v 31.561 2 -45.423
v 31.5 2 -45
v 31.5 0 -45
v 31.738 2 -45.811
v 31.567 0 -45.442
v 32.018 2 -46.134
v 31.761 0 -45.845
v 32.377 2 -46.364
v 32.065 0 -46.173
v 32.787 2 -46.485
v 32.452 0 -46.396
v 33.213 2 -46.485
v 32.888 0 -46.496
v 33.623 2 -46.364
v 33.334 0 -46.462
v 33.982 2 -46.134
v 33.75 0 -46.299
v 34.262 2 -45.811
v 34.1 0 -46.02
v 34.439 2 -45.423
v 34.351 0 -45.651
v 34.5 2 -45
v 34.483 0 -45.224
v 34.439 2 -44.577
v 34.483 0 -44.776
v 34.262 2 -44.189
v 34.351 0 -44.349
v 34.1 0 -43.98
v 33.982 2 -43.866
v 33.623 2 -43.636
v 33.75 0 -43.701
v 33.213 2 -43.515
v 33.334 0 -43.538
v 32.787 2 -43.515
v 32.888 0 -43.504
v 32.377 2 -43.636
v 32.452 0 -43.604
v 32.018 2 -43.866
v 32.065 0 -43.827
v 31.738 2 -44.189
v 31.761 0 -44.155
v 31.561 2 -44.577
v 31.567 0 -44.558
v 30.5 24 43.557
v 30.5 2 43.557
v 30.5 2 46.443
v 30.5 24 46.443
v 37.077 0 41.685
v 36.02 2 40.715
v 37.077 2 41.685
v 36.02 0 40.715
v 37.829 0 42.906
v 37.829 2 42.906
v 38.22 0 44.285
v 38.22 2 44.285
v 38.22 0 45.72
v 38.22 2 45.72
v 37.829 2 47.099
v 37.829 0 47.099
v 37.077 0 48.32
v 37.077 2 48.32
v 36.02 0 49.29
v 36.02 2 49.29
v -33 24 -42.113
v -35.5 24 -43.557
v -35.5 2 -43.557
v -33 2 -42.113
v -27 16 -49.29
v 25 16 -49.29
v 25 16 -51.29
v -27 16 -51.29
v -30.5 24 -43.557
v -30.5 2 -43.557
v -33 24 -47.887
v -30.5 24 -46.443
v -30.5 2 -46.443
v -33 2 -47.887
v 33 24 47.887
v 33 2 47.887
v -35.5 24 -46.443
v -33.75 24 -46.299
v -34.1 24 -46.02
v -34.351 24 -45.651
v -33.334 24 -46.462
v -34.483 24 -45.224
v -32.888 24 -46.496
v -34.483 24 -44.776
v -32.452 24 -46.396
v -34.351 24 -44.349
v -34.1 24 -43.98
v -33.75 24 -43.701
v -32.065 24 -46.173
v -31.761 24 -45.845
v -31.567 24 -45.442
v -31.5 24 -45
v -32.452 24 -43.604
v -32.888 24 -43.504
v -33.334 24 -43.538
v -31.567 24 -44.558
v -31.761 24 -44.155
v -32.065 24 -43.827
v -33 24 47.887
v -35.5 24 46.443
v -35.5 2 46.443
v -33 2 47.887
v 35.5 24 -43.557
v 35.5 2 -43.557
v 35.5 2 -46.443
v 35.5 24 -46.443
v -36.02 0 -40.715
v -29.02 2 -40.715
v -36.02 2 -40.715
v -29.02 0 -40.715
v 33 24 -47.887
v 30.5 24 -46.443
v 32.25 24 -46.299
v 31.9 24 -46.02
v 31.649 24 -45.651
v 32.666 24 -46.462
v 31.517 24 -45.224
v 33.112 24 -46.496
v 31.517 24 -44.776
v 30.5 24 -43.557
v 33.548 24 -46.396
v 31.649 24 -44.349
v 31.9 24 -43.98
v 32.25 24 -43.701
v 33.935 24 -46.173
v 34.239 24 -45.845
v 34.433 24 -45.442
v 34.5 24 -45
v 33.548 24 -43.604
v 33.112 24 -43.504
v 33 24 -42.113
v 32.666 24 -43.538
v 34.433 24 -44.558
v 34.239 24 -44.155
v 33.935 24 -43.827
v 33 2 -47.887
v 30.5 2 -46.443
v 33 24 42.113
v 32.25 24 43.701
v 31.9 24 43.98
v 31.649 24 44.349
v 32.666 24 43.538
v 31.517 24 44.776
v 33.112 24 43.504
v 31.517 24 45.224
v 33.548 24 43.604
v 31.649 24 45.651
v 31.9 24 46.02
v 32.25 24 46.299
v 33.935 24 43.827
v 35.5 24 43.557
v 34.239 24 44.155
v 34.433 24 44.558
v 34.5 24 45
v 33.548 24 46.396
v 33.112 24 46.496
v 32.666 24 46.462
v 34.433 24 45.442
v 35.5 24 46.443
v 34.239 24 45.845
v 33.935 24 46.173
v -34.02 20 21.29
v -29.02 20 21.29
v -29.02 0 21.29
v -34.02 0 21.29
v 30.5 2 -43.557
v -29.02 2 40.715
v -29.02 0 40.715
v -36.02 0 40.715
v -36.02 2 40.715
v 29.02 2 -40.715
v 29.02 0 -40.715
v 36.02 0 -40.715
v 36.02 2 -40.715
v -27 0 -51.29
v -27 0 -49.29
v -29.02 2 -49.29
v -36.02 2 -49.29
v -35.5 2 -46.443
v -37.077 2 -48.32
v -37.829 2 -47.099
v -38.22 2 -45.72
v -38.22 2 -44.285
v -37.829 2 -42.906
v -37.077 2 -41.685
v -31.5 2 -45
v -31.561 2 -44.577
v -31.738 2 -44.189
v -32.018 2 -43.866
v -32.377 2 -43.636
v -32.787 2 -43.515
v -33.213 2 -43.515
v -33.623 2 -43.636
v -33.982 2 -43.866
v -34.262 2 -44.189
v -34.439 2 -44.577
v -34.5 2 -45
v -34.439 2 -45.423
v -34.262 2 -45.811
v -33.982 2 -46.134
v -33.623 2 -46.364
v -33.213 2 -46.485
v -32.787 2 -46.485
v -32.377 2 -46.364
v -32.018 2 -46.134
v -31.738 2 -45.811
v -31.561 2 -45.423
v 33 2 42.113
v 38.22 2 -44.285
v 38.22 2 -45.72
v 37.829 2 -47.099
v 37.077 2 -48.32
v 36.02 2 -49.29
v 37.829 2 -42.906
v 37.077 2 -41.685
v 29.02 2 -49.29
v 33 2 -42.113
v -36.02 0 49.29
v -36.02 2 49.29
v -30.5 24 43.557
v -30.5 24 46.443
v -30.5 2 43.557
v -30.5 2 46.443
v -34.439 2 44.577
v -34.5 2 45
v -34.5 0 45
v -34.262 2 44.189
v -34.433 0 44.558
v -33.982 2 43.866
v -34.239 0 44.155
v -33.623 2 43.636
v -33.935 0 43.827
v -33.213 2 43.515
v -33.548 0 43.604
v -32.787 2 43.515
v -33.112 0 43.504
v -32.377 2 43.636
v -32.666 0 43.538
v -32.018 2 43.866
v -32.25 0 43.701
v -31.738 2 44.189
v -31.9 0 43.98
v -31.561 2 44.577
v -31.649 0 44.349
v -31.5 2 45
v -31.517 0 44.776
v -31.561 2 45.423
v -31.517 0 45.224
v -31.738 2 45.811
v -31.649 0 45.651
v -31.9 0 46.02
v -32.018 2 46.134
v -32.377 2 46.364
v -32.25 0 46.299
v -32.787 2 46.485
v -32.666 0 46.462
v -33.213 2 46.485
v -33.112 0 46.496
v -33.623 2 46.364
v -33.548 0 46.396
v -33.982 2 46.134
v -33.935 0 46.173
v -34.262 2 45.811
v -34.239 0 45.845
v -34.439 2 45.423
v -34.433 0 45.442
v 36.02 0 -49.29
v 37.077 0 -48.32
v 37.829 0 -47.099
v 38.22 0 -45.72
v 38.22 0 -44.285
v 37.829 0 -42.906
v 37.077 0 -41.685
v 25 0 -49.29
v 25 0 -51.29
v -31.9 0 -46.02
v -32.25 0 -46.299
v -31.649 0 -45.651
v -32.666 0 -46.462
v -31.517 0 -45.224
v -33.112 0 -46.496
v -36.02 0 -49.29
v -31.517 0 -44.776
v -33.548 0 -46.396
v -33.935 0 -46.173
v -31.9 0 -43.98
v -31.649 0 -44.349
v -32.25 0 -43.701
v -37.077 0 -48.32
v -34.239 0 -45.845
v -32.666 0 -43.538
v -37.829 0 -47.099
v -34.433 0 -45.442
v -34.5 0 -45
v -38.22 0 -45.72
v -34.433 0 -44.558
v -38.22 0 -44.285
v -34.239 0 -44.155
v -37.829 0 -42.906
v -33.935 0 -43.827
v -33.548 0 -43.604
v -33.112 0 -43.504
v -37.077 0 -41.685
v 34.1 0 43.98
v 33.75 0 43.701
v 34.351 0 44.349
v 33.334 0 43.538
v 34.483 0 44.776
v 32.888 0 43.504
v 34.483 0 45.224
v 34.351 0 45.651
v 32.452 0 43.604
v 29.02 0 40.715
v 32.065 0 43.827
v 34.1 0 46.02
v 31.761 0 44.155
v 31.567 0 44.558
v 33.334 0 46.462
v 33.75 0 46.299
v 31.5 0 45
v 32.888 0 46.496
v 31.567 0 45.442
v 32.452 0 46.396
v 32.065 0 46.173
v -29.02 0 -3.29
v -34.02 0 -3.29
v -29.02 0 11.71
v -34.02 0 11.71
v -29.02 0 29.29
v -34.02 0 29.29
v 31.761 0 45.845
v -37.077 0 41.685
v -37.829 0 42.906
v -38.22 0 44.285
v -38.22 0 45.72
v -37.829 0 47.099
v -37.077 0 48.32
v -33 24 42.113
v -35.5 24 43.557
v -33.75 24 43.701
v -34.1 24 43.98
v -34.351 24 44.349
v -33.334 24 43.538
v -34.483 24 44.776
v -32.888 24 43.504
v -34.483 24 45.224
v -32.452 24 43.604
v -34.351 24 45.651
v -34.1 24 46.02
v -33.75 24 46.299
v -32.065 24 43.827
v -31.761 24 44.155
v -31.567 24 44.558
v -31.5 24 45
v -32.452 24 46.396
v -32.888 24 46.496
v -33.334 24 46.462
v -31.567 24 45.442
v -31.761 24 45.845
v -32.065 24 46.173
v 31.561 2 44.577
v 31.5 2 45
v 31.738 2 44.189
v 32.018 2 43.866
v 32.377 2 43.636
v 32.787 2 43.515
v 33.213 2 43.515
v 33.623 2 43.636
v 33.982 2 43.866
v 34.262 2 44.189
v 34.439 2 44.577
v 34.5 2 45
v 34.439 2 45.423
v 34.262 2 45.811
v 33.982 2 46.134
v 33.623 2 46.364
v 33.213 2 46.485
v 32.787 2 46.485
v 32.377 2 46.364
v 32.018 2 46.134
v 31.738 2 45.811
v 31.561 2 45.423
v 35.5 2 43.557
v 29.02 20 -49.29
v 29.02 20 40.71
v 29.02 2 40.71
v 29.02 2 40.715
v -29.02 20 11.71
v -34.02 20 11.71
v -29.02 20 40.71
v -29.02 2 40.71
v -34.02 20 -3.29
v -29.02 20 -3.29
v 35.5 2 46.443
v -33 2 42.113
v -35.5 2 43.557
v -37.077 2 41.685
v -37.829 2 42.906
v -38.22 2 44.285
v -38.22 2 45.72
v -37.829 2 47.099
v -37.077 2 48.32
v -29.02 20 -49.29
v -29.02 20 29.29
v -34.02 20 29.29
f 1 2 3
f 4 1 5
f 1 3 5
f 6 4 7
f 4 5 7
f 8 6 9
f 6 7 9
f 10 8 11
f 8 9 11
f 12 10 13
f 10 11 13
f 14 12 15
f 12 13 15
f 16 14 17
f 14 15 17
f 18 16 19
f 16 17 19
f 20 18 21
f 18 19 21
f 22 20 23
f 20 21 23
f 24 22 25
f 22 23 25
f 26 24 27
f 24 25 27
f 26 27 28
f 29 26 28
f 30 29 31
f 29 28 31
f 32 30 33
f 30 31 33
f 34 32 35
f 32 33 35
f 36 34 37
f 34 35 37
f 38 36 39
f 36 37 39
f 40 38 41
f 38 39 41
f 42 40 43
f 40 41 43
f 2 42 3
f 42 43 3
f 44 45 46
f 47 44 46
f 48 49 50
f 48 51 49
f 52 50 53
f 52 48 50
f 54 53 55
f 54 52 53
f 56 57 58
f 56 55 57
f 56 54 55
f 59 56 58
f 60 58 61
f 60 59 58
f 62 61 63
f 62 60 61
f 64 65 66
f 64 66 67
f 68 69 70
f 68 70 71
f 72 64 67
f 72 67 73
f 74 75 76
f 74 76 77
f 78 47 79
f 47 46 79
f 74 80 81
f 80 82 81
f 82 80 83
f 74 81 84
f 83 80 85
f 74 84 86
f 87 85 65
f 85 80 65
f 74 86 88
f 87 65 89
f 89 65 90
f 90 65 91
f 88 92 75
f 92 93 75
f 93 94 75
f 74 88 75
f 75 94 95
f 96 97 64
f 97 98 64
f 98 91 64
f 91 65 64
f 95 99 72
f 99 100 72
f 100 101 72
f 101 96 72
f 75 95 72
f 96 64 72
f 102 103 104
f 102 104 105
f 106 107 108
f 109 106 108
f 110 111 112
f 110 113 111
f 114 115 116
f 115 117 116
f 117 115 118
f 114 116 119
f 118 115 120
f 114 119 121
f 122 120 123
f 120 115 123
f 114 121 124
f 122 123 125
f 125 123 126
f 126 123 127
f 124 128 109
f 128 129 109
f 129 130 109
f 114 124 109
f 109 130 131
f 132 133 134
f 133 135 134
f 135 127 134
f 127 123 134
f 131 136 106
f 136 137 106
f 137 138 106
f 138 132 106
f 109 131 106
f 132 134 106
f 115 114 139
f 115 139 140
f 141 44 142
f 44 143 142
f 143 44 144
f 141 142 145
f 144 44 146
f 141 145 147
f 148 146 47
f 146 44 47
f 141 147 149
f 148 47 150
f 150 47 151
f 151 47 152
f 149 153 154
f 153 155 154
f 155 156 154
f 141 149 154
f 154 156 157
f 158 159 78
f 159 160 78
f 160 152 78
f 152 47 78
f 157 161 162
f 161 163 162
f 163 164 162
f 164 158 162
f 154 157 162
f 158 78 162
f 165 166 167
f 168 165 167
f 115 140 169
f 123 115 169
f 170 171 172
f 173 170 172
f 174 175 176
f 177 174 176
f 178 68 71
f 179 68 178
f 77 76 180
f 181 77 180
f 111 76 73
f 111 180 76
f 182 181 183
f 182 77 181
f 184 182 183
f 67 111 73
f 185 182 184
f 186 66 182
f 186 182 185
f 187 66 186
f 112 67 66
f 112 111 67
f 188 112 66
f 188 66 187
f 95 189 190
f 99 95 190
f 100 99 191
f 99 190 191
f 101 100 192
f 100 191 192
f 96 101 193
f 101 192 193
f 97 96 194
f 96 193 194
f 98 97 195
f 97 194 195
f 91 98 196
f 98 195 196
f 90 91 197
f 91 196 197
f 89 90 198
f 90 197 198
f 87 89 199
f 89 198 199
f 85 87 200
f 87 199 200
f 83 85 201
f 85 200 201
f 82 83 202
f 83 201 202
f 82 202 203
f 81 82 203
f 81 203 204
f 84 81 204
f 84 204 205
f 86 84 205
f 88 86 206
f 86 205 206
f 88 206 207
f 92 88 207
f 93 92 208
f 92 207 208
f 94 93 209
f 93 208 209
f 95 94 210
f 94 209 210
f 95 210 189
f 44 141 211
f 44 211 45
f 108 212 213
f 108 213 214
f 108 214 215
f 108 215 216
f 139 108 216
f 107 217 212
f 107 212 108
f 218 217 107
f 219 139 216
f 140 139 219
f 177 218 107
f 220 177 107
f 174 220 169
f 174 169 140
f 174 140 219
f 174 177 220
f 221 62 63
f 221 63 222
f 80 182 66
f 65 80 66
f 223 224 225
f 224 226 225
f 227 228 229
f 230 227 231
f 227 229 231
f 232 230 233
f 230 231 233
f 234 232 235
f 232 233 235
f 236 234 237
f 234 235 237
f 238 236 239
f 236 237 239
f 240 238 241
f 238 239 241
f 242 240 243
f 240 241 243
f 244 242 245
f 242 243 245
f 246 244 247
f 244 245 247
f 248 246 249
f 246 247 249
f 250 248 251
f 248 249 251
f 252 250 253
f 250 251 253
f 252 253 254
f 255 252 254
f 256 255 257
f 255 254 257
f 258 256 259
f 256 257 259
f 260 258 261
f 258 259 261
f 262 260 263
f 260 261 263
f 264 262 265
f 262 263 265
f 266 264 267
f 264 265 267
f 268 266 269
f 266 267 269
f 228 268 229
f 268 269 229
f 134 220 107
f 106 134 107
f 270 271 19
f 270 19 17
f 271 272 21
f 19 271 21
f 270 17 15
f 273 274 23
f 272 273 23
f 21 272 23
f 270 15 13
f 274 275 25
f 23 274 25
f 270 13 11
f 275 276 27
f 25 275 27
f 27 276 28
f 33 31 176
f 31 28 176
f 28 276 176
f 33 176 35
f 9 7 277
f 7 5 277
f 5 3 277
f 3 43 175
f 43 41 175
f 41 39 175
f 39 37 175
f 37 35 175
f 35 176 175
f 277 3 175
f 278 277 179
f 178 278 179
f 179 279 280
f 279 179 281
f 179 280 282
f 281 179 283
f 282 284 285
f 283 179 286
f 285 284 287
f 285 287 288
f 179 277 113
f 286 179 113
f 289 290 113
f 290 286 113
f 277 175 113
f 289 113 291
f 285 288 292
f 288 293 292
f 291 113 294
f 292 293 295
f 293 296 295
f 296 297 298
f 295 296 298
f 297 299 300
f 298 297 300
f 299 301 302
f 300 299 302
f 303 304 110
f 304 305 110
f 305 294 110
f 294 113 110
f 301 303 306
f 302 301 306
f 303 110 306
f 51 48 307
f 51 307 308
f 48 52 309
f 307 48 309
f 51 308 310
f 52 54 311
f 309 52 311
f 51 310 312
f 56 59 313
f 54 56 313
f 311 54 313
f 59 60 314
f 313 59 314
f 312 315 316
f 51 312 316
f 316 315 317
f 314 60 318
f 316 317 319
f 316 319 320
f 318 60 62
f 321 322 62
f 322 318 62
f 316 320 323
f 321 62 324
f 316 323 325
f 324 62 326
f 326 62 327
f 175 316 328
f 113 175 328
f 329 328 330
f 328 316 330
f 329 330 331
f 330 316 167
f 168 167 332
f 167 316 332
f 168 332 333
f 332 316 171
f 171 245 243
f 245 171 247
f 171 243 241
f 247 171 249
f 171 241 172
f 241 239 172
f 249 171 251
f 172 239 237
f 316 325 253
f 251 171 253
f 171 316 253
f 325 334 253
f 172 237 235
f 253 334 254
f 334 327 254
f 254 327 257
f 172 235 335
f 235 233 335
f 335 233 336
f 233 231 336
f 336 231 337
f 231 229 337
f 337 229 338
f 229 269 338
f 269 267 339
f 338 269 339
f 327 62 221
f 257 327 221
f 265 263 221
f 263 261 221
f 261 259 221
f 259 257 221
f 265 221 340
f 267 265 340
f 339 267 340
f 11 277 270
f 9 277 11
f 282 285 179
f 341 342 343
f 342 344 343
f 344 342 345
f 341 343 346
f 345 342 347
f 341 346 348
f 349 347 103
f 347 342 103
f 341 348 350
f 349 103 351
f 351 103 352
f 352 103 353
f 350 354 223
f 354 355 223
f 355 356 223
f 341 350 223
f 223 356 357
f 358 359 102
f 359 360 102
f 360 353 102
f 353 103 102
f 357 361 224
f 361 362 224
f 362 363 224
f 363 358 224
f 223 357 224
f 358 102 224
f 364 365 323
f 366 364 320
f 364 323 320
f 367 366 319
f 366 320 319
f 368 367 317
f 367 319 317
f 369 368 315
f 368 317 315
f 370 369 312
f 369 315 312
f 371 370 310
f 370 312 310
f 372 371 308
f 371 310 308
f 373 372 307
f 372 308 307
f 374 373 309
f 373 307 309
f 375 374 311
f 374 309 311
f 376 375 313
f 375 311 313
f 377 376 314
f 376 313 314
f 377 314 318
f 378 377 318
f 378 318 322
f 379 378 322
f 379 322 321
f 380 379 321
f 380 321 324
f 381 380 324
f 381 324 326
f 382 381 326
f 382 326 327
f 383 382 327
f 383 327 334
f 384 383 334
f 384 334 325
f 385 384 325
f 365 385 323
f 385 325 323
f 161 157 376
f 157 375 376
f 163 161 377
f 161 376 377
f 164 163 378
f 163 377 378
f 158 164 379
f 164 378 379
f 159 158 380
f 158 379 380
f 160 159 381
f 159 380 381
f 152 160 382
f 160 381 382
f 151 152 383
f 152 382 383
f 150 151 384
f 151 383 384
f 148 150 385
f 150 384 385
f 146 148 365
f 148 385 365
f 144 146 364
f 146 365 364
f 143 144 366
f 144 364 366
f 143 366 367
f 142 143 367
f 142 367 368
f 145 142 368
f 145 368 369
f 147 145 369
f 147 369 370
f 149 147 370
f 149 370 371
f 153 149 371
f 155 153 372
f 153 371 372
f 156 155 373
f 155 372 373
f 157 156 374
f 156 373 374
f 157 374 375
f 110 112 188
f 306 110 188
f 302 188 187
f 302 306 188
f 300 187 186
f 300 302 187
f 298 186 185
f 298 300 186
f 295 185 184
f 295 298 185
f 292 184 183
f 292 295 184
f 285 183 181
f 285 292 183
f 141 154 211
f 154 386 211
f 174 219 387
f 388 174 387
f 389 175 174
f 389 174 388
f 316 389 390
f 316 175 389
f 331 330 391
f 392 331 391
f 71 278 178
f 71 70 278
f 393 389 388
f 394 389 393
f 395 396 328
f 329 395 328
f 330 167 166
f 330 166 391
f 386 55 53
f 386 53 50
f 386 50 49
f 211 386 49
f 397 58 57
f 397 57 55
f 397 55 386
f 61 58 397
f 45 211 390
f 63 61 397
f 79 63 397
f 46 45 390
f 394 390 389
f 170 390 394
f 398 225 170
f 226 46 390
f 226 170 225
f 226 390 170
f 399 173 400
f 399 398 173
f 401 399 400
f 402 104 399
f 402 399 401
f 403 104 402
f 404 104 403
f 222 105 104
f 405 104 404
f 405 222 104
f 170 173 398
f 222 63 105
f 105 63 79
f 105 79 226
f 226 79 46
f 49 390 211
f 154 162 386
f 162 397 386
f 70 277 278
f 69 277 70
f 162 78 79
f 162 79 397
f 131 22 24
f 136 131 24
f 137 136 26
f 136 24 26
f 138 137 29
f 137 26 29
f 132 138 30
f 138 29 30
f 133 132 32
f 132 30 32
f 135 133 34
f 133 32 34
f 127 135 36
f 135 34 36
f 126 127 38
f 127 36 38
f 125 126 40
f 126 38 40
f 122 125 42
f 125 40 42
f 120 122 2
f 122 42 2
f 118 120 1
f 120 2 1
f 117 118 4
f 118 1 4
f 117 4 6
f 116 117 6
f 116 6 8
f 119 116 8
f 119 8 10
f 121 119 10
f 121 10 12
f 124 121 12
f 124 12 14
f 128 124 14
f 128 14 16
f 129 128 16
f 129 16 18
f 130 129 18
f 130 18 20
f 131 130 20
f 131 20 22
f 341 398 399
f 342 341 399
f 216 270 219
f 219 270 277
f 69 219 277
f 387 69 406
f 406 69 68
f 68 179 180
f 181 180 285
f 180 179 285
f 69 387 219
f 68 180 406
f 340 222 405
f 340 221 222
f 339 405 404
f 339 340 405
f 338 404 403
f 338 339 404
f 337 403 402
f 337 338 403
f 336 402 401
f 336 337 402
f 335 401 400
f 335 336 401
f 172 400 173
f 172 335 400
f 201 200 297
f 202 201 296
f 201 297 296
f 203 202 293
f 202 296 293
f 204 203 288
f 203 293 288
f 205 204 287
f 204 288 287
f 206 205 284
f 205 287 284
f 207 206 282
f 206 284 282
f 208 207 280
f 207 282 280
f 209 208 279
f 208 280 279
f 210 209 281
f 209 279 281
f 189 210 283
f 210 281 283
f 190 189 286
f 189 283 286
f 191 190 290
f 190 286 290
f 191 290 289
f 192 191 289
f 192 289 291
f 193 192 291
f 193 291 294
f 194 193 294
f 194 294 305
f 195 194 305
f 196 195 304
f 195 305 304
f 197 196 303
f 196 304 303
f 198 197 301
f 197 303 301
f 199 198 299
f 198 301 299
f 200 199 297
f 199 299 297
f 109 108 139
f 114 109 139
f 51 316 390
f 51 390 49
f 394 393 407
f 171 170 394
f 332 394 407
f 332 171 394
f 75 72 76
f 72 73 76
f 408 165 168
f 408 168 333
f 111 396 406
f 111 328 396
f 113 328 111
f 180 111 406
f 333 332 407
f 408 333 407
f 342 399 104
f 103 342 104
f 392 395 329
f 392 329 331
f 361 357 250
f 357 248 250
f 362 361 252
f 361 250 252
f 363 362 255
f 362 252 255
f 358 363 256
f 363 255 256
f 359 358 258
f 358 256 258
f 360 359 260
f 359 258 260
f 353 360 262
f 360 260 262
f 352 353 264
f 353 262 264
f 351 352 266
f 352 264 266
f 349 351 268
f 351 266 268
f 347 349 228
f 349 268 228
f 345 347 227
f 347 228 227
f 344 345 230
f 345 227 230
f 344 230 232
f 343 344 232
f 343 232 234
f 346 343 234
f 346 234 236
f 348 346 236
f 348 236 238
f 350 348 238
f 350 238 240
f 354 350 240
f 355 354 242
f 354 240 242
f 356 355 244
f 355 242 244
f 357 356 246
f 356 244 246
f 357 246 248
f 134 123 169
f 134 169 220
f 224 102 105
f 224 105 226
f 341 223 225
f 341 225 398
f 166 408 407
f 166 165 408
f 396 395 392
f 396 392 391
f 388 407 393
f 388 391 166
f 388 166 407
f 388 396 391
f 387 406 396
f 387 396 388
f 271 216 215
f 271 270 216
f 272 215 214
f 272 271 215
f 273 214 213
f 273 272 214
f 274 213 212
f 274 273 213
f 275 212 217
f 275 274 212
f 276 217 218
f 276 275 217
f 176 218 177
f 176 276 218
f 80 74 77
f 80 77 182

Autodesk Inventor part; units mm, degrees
ref_plane "YZ Plane" through (0, 0, 0) normal (1, 0, 0) x (0, 1, 0)
ref_plane "XZ Plane" through (0, 0, 0) normal (0, 1, 0) x (-1, 0, 0)
ref_plane "XY Plane" through (0, 0, 0) normal (0, 0, 1) x (1, 0, 0)
sketch "Sketch1" plane through (0, 0, 0) normal (0, 1, 0) x (-1, 0, 0)
  line L0 (-29.02, 49.29) -> (29.02, 49.29)
  line L1 (29.02, 49.29) -> (29.02, 40.715) construction
  line L2 (29.02, -49.29) -> (-29.02, -49.29)
  line L3 (-29.02, -49.29) -> (-29.02, -40.715) construction
  line L4 (-29.02, 49.29) -> (29.02, -49.29) construction
  line L5 (29.02, 49.29) -> (-29.02, -49.29) construction
  line L6 (-33, 45) -> (33, 45) construction
  line L7 (33, 45) -> (33, -45) construction
  line L8 (33, -45) -> (-33, -45) construction
  line L9 (-33, -45) -> (-33, 45) construction
  line L10 (-33, 45) -> (33, -45) construction
  line L11 (33, 45) -> (-33, -45) construction
  circle A0 centre (33, 45) radius 1.5
  circle A1 centre (33, -45) radius 1.5
  circle A2 centre (-33, -45) radius 1.5
  circle A3 centre (-33, 45) radius 1.5
  line L12 (-38.27, 49.29) -> (38.27, 49.29) construction
  line L13 (38.27, 49.29) -> (38.27, -49.29) construction
  line L14 (38.27, -49.29) -> (-38.27, -49.29) construction
  line L15 (-38.27, -49.29) -> (-38.27, 49.29) construction
  line L16 (-38.27, 49.29) -> (38.27, -49.29) construction
  line L17 (38.27, 49.29) -> (-38.27, -49.29) construction
  line L18 (-38.27, 40.715) -> (29.02, 40.715) construction
  line L19 (38.27, 40.715) -> (38.27, -40.715) construction
  line L20 (38.27, -40.715) -> (-38.27, -40.715) construction
  line L21 (-38.27, -40.715) -> (-38.27, 40.715) construction
  line L22 (-38.27, 40.715) -> (38.27, -40.715) construction
  line L23 (38.27, 40.715) -> (-38.27, -40.715) construction
  line L24 (29.02, 49.29) -> (36.02, 49.29)
  line L25 (29.02, 40.715) -> (36.02, 40.715)
  arc A4 (36.02, 40.715) -> (36.02, 49.29) centre (33.06, 45.0025) ccw
  line L26 (29.02, 40.715) -> (29.02, -40.715)
  line L27 (0, 49.29) -> (0, -49.29) construction
  line L28 (-29.02, 0) -> (29.02, 0) construction
  line L29 (-38.27, -49.29) -> (38.27, -49.29) construction
  line L30 (-38.27, -40.715) -> (38.27, -40.715) construction
  line L31 (29.02, -49.29) -> (36.02, -49.29)
  line L32 (29.02, -40.715) -> (36.02, -40.715)
  arc A5 (36.02, -49.29) -> (36.02, -40.715) centre (33.06, -45.0025) ccw
  line L33 (0, -49.29) -> (0, 49.29) construction
  line L34 (-33, 45) -> (-33, -45) construction
  line L35 (38.27, 49.29) -> (-38.27, 49.29) construction
  line L36 (-38.27, 49.29) -> (-38.27, -49.29) construction
  line L37 (-38.27, -49.29) -> (38.27, -49.29) construction
  line L38 (38.27, 40.715) -> (-38.27, 40.715) construction
  line L39 (-38.27, -40.715) -> (38.27, -40.715) construction
  line L40 (-29.02, 49.29) -> (-36.02, 49.29)
  line L41 (-29.02, 40.715) -> (-36.02, 40.715)
  arc A6 (-36.02, 49.29) -> (-36.02, 40.715) centre (-33.06, 45.0025) ccw
  line L42 (38.27, -49.29) -> (-38.27, -49.29) construction
  line L43 (-29.02, -49.29) -> (-36.02, -49.29)
  line L44 (38.27, -40.715) -> (-38.27, -40.715) construction
  line L45 (-29.02, -40.715) -> (-36.02, -40.715)
  arc A7 (-36.02, -40.715) -> (-36.02, -49.29) centre (-33.06, -45.0025) ccw
  line L46 (-29.02, -40.715) -> (-29.02, 40.715)
  line L47 (-29.02, 40.715) -> (-29.02, 49.29) construction
  line L48 (29.02, 40.715) -> (38.27, 40.715) construction
  line L49 (29.02, -40.715) -> (29.02, -49.29) construction
  point P0 (0, 0)
  dimension "d0" = 58.04
  dimension "d1" = 98.58
  dimension "d2" = 66
  dimension "d3" = 90
  dimension "d4" = 3
  dimension "d5" = 3
  dimension "d6" = 3
  dimension "d7" = 3
  dimension "d8" = 76.54
  dimension "d9" = 98.58
  dimension "d10" = 76.54
  dimension "d11" = 81.43
  dimension "d12" = 7
  dimension "d13" = 7
extrude "Extrusion1" add sketch "Sketch1" along normal blind 2
sketch "Sketch2" plane through (0, 2, 0) normal (0, 1, 0) x (1, 0, 0)
  line L0 (29.02, -49.29) -> (-29.02, -49.29) construction
  line L1 (-29.02, -49.29) -> (-29.02, 49.29) construction
  line L2 (-29.02, 49.29) -> (29.02, 49.29) construction
  line L3 (29.02, 49.29) -> (29.02, -49.29) construction
  line L4 (29.02, -49.29) -> (-29.02, 49.29) construction
  line L5 (-29.02, -49.29) -> (29.02, 49.29) construction
  line L6 (29.02, 40.715) -> (29.02, -40.715) projected
  line L7 (-29.02, 49.29) -> (29.02, 49.29)
  line L8 (29.02, 49.29) -> (29.02, -40.71)
  line L9 (29.02, -40.71) -> (-29.02, -40.71)
  line L10 (-29.02, -40.71) -> (-29.02, 49.29)
  point P0 (0, 0)
  dimension "d16" = 58.04
  dimension "d17" = 98.58
  dimension "d18" = 90
extrude "Extrusion2" add sketch "Sketch2" along normal blind 18
sketch "Sketch3" plane through (-29.02, 0, -40.715) normal (-1, 0, 0) x (0, 0, 1)
  line L0 (-8.575, 0) -> (-8.575, 2) projected
  line L1 (-8.575, 0) -> (37.425, 0) construction
  line L2 (81.43, 0) -> (0, 0) construction
  line L3 (37.425, 0) -> (52.425, 0) construction
  line L4 (37.425, 0) -> (52.425, 0)
  line L5 (52.425, 0) -> (52.425, 20)
  line L6 (52.425, 20) -> (37.425, 20)
  line L7 (37.425, 20) -> (37.425, 0)
  line L8 (81.43, 0) -> (90.005, 0) construction
  line L9 (90.005, 0) -> (70.005, 0) construction
  line L10 (70.005, 0) -> (62.005, 0) construction
  line L11 (62.005, 0) -> (70.005, 0)
  line L12 (70.005, 0) -> (70.005, 20)
  line L13 (70.005, 20) -> (62.005, 20)
  line L14 (62.005, 20) -> (62.005, 0)
  point P0 (40.715, 0)
  dimension "d21" = 46
  dimension "d22" = 15
  dimension "d23" = 20
  dimension "d24" = 15
  dimension "d25" = 20
  dimension "d26" = 8
  dimension "d27" = 8
  dimension "d28" = 20
extrude "Extrusion3" add sketch "Sketch3" along normal blind 5
sketch "Sketch5" plane through (0, 0, 0) normal (0, -1, 0) x (1, 0, 0)
  circle A0 centre (-33, 45) radius 1.5 construction
  line L0 (33, -45) -> (-33, -45) construction
  line L1 (-33, -45) -> (-33, 45) construction
  line L2 (-33, 45) -> (33, 45) construction
  line L3 (33, 45) -> (33, -45) construction
  line L4 (33, -45) -> (-33, 45) construction
  line L5 (-33, -45) -> (33, 45) construction
  circle A1 centre (-33, -45) radius 1.5
  circle A2 centre (33, -45) radius 1.5
  circle A3 centre (33, 45) radius 1.5 projected
  circle A4 centre (33, 45) radius 1.5
  circle A5 centre (-33, 45) radius 1.5
  line L6 (-35.5, -43.5566) -> (-33, -42.1132)
  line L7 (-33, -42.1132) -> (-30.5, -43.5566)
  line L8 (-30.5, -43.5566) -> (-30.5, -46.4434)
  line L9 (-30.5, -46.4434) -> (-33, -47.8868)
  line L10 (-33, -47.8868) -> (-35.5, -46.4434)
  line L11 (-35.5, -46.4434) -> (-35.5, -43.5566)
  line L12 (30.5, -43.5566) -> (33, -42.1132)
  line L13 (33, -42.1132) -> (35.5, -43.5566)
  line L14 (35.5, -43.5566) -> (35.5, -46.4434)
  line L15 (35.5, -46.4434) -> (33, -47.8868)
  line L16 (33, -47.8868) -> (30.5, -46.4434)
  line L17 (30.5, -46.4434) -> (30.5, -43.5566)
  line L18 (30.5, 46.4434) -> (33, 47.8868)
  line L19 (33, 47.8868) -> (35.5, 46.4434)
  line L20 (35.5, 46.4434) -> (35.5, 43.5566)
  line L21 (35.5, 43.5566) -> (33, 42.1132)
  line L22 (33, 42.1132) -> (30.5, 43.5566)
  line L23 (30.5, 43.5566) -> (30.5, 46.4434)
  line L24 (-35.5, 46.4434) -> (-33, 47.8868)
  line L25 (-33, 47.8868) -> (-30.5, 46.4434)
  line L26 (-30.5, 46.4434) -> (-30.5, 43.5566)
  line L27 (-30.5, 43.5566) -> (-33, 42.1132)
  line L28 (-33, 42.1132) -> (-35.5, 43.5566)
  line L29 (-35.5, 43.5566) -> (-35.5, 46.4434)
  point P0 (0, 0)
  point P1 (30.5, 45)
  point P2 (-35.5, 45)
  dimension "d31" = 3
  dimension "d32" = 3
  dimension "d33" = 3
  dimension "d34" = 3
  dimension "d35" = 5
  dimension "d36" = 5
  dimension "d37" = 5
  dimension "d38" = 5
extrude "Extrusion4" add sketch "Sketch5" against normal blind 22 from surface at -2
sketch "Sketch6" plane through (0, 0, 0) normal (0, -1, 0) x (1, 0, 0)
  line L0 (-35.8509, -30.6551) -> (-35.8509, -21.9955) construction
  line L1 (-35.8509, -21.9955) -> (-14.7214, -21.9955) construction
  line L2 (-14.7214, -21.9955) -> (-14.7214, -30.6551) construction
  line L3 (-14.7214, -30.6551) -> (-35.8509, -30.6551) construction
  point P0 (0, 0)
sketch "Sketch7" plane through (36.02, 0, -49.29) normal (0, 0, -1) x (-1, 0, 0)
  line L0 (36.02, 0) -> (63.02, 0) construction
  line L1 (0, 0) -> (72.04, 0) projected
  line L2 (63.02, 0) -> (11.02, 0)
  line L3 (11.02, 0) -> (11.02, 16)
  line L4 (11.02, 16) -> (63.02, 16)
  line L5 (63.02, 16) -> (63.02, 0)
  dimension "d41" = 27
  dimension "d42" = 52
  dimension "d43" = 16
extrude "Extrusion5" add sketch "Sketch7" along normal blind 2
sketch "Sketch8" plane through (0, 0, 0) normal (0, -1, 0) x (1, 0, 0)
  line L0 (-24.9386, -43.252) -> (-24.9386, 42.092) construction
  line L1 (-24.9386, 42.092) -> (23.0674, 42.092) construction
  line L2 (23.0674, 42.092) -> (23.0674, -43.252) construction
  line L3 (23.0674, -43.252) -> (-24.9386, -43.252) construction
  point P0 (0, 0)
equation "\"d24\" = d22"
properties part number "raspberry+touch"
